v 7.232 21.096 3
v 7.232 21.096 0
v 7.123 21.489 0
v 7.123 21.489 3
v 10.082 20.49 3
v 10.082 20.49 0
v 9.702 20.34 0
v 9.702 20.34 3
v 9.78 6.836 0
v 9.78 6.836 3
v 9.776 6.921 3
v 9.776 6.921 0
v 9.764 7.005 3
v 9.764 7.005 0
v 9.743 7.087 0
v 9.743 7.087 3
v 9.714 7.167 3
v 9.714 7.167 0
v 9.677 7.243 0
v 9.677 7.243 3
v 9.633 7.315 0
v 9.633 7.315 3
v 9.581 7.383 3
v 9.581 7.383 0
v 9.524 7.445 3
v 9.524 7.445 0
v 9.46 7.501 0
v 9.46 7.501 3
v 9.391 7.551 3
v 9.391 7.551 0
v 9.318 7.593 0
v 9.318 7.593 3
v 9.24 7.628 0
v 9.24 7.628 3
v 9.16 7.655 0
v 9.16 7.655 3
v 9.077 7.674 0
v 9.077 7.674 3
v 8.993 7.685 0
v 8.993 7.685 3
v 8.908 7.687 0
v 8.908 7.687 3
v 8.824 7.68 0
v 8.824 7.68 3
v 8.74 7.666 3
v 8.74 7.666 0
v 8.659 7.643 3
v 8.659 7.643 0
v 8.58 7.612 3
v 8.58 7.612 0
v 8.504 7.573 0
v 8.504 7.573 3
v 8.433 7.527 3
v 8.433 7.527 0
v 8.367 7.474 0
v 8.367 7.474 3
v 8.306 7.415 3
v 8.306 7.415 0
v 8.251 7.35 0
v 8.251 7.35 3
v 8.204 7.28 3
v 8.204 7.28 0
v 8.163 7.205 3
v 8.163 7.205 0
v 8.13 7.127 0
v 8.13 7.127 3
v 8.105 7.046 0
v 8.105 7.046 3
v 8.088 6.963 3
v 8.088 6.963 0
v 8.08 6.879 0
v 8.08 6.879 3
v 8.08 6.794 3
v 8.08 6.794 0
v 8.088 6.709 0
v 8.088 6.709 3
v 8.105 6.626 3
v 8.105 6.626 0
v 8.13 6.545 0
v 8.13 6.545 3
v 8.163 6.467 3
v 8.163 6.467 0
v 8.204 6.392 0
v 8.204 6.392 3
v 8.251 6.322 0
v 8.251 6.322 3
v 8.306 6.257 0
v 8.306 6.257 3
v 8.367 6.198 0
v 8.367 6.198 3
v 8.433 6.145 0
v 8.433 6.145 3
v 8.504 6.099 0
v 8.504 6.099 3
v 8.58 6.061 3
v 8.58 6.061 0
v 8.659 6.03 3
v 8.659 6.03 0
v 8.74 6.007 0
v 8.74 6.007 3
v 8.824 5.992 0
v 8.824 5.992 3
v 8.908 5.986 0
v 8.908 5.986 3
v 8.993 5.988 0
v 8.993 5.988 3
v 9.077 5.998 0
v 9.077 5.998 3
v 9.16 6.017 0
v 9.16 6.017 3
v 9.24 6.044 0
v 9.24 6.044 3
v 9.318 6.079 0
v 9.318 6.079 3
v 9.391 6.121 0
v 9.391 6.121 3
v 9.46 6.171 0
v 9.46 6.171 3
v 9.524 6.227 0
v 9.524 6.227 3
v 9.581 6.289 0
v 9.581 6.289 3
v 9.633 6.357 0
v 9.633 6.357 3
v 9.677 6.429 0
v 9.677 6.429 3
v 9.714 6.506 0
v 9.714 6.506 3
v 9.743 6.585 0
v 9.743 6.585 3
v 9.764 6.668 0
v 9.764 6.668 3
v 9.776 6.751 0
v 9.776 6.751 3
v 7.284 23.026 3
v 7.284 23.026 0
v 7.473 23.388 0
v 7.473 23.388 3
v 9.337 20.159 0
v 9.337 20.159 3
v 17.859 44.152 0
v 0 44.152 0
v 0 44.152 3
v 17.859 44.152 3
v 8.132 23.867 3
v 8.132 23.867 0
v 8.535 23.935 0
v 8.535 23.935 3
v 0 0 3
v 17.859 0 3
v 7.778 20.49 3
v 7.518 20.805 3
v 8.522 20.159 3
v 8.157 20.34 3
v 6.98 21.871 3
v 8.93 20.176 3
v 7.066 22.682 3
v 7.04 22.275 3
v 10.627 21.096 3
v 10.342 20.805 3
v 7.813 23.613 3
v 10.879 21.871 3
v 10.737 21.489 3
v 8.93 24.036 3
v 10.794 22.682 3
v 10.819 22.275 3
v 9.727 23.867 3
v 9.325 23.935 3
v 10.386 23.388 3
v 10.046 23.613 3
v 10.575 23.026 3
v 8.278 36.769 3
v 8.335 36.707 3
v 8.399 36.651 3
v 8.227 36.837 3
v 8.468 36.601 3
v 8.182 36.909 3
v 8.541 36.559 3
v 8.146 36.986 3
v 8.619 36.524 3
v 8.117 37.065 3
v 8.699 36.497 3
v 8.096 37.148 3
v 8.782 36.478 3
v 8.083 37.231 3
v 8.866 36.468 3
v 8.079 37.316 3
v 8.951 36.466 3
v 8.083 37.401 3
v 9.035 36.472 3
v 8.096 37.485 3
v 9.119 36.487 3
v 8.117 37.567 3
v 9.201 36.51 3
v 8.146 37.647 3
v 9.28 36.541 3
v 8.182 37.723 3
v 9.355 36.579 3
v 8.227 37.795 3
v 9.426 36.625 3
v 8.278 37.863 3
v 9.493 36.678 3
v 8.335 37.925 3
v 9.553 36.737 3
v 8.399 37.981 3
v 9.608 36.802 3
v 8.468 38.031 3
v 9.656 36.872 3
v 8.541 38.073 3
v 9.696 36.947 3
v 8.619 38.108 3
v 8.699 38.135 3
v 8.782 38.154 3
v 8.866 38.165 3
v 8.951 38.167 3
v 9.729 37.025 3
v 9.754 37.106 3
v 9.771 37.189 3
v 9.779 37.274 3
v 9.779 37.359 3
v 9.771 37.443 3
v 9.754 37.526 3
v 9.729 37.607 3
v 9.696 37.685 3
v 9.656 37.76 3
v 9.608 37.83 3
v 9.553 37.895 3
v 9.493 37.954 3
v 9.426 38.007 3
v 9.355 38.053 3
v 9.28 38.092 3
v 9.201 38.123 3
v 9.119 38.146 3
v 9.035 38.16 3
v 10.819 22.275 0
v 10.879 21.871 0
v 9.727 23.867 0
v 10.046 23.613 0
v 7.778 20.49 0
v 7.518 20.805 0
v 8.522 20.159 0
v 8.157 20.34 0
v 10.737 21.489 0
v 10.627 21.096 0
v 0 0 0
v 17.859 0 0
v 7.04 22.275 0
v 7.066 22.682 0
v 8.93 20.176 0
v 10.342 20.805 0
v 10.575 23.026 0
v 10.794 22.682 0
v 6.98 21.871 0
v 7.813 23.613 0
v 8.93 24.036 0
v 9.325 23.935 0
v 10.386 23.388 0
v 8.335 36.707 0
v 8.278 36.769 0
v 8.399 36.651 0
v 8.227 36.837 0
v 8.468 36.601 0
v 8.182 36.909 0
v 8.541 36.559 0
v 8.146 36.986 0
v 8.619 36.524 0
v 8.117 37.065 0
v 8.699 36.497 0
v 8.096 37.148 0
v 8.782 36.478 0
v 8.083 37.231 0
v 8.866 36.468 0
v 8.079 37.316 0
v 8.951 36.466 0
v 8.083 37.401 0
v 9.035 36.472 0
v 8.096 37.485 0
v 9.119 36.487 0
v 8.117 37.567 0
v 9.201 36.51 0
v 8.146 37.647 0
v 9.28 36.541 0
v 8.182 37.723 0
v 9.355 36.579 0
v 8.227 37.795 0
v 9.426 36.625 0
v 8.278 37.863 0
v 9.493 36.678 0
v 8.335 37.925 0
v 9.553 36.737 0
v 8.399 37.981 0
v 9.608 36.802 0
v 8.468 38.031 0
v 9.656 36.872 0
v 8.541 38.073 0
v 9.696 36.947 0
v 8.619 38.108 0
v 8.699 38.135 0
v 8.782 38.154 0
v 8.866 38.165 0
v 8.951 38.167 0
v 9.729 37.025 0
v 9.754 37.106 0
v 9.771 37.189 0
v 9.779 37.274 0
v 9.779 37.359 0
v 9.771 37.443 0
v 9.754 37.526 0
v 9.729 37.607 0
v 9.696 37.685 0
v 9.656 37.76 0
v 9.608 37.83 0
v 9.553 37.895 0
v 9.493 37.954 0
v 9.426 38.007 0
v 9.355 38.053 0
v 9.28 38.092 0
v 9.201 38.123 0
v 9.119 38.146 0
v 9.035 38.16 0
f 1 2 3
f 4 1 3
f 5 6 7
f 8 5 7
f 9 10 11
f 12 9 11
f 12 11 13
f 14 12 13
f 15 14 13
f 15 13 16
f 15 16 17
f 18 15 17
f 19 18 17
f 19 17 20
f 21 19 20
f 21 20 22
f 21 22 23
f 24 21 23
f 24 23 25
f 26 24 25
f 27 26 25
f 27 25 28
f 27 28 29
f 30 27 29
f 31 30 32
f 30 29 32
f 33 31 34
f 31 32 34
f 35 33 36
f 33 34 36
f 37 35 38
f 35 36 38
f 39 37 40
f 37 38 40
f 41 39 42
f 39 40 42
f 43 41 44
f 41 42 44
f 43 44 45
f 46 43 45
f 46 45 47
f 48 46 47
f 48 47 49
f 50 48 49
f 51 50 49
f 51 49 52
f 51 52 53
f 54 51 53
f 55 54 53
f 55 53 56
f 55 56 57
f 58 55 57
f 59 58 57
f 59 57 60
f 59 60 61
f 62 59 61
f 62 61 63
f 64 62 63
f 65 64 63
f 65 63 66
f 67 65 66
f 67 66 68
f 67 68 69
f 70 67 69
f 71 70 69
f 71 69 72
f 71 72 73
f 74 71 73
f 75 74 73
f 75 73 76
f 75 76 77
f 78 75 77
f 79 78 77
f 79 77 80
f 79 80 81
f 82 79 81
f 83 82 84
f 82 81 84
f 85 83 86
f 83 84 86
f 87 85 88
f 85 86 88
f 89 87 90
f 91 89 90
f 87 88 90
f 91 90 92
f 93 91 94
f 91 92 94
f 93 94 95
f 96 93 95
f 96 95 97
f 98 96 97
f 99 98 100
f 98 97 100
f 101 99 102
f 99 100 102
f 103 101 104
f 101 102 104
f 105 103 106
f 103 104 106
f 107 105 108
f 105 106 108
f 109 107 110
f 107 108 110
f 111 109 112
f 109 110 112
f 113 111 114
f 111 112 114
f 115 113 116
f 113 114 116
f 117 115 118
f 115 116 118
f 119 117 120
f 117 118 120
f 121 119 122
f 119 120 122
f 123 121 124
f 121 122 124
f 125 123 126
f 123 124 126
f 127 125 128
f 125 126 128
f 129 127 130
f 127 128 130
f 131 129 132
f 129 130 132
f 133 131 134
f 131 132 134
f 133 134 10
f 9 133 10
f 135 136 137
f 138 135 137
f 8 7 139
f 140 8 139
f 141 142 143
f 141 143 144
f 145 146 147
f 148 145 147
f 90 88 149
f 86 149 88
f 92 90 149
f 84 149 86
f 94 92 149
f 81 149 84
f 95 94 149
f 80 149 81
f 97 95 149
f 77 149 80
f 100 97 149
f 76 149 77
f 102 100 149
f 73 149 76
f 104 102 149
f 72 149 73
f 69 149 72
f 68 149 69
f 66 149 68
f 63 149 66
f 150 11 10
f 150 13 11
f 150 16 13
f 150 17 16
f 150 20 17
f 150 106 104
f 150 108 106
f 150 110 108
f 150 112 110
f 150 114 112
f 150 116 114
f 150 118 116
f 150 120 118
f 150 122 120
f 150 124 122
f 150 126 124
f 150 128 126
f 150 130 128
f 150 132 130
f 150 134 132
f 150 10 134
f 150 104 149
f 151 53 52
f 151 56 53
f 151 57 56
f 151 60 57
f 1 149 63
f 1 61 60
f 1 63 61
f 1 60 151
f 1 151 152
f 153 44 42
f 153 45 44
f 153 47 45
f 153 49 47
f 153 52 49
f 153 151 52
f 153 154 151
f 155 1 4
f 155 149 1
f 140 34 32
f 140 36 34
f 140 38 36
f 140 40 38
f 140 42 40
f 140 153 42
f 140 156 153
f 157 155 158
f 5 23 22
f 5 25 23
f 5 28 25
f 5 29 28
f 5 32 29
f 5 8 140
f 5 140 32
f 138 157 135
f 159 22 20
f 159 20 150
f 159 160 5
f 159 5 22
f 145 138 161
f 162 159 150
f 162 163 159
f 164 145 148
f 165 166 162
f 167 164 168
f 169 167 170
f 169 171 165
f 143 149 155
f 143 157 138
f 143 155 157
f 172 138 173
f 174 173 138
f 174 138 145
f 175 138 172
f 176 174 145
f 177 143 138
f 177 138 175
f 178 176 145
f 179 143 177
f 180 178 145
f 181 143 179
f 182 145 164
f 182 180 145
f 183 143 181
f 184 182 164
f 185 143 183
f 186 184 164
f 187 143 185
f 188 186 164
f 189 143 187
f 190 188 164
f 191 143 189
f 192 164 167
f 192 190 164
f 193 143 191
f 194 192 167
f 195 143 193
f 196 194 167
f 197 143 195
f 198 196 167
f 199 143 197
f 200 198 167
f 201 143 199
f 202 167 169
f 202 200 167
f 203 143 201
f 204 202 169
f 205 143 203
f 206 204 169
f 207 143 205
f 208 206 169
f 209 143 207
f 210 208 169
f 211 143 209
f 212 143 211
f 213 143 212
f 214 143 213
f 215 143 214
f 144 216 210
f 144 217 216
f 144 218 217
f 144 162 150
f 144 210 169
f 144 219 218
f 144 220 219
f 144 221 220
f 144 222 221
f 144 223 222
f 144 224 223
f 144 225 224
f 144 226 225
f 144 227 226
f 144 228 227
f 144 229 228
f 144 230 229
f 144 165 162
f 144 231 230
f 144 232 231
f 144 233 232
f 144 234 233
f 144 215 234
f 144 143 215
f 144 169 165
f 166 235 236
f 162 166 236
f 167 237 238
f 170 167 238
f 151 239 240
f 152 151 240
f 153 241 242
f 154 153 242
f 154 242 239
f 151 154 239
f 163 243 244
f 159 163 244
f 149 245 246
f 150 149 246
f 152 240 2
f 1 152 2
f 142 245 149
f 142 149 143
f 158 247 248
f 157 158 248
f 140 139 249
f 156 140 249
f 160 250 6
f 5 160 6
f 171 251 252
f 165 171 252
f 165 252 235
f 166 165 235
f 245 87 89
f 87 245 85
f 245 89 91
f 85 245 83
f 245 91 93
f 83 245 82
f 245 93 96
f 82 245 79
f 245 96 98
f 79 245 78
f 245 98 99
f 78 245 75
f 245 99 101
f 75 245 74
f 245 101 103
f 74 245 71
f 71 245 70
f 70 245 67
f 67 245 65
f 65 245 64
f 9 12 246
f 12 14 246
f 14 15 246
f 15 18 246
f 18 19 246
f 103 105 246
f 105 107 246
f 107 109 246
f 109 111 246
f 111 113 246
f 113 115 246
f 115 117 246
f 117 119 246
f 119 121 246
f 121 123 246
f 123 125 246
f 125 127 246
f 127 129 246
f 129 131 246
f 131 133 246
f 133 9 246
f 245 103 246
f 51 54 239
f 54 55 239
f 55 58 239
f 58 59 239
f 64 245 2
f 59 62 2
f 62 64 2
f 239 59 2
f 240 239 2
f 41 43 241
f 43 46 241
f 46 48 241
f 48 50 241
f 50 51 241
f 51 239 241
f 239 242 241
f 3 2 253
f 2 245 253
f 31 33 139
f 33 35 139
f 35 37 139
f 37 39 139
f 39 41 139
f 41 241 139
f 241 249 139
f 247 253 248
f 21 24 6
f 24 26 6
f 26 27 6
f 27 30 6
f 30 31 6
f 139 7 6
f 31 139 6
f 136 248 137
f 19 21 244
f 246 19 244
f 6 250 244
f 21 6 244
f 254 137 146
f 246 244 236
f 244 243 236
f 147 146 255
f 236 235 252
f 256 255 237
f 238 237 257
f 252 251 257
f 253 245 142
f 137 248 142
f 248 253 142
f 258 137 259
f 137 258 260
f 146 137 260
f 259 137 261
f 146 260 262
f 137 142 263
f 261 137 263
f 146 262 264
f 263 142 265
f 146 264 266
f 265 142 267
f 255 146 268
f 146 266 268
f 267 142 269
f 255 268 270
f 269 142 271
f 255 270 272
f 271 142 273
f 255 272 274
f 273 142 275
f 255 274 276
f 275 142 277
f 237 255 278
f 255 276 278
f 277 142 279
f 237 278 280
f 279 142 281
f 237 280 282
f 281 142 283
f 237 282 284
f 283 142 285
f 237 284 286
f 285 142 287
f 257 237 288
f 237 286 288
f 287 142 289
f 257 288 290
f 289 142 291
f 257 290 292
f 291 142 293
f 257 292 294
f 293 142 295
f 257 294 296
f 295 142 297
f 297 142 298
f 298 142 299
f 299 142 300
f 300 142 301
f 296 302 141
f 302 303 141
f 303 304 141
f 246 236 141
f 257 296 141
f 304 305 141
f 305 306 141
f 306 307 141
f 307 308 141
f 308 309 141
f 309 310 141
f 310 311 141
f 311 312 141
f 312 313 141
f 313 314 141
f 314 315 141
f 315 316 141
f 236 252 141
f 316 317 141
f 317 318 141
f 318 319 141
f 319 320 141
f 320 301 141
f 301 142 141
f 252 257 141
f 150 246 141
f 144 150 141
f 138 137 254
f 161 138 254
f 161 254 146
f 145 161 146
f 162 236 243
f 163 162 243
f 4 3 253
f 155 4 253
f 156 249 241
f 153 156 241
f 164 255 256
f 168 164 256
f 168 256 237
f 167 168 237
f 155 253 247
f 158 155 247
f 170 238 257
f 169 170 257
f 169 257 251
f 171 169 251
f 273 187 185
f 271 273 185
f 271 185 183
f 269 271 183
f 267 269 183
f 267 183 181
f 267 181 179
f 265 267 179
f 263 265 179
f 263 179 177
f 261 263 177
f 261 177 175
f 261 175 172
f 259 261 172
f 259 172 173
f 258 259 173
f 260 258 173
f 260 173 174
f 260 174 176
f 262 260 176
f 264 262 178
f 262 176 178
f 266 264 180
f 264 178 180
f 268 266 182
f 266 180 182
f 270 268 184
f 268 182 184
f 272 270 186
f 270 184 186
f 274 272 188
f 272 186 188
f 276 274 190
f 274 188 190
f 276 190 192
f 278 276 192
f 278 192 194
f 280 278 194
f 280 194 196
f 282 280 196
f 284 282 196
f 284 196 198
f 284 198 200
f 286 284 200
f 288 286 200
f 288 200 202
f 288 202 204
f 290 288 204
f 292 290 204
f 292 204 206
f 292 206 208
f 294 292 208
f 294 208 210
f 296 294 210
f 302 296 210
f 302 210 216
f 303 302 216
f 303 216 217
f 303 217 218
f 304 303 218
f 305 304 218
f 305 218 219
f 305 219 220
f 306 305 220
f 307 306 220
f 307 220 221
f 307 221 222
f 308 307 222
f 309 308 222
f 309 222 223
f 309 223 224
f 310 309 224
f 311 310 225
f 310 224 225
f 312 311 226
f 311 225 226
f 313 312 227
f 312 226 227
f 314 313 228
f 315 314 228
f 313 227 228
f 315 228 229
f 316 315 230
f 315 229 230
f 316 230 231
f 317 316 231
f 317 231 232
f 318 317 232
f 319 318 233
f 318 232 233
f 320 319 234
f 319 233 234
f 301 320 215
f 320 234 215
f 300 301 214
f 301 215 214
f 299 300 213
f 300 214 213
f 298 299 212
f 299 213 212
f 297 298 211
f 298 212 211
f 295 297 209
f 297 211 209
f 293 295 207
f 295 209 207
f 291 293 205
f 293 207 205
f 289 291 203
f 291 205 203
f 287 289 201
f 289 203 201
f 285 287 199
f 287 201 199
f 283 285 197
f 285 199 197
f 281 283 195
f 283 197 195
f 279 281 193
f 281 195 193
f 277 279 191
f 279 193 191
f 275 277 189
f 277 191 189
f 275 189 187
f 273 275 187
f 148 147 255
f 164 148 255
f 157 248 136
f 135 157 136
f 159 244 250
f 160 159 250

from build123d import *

# Parameters (mm, degrees)
MODEL_W             = 17.8592
MODEL_H             = 44.1523
BOSS_EXTRUDE1_DEPTH = 3
SKETCH2_R           = 0.8509
CUT_EXTRUDE1_DEPTH  = 48.721867314


with BuildPart() as part:
    # Model → Boss-Extrude1 (new body)
    with BuildSketch(Plane.XY):
        with Locations((8.9296, 22.07615)):
            Rectangle(MODEL_W, MODEL_H)
        Polygon((8.9296, 24.03615), (9.324632213, 23.934630441), (9.72680382, 23.866699097), (10.046391979, 23.613282289), (10.386163858, 23.387645988), (10.575048267, 23.02615), (10.793670772, 22.681823309), (10.819191601, 22.27475408), (10.878862915, 21.871274212), (10.736607381, 21.489017711), (10.627009791, 21.09615), (10.341575168, 20.804801848), (10.081659094, 20.490476691), (9.702399622, 20.34041363), (9.337106914, 20.158980703), (8.9296, 20.17615), (8.522093086, 20.158980703), (8.156800378, 20.34041363), (7.777540906, 20.490476691), (7.517624832, 20.804801848), (7.232190209, 21.09615), (7.122592619, 21.489017711), (6.980337085, 21.871274212), (7.040008399, 22.27475408), (7.065529228, 22.681823309), (7.284151733, 23.02615), (7.473036142, 23.387645988), (7.812808021, 23.613282289), (8.13239618, 23.866699097), (8.534567787, 23.934630441), align=None, mode=Mode.SUBTRACT)
    extrude(amount=BOSS_EXTRUDE1_DEPTH)

    # Sketch2 → Cut-Extrude1 (cut, through all)
    with BuildSketch(Plane.XY.offset(3)):
        with Locations((8.9296, 6.83615)):
            Circle(SKETCH2_R)
        with Locations(Location((8.9296, 37.31615, 0), (0, 0, 180))):
            Circle(SKETCH2_R)
    extrude(amount=-CUT_EXTRUDE1_DEPTH, mode=Mode.SUBTRACT)


solid = part.part
